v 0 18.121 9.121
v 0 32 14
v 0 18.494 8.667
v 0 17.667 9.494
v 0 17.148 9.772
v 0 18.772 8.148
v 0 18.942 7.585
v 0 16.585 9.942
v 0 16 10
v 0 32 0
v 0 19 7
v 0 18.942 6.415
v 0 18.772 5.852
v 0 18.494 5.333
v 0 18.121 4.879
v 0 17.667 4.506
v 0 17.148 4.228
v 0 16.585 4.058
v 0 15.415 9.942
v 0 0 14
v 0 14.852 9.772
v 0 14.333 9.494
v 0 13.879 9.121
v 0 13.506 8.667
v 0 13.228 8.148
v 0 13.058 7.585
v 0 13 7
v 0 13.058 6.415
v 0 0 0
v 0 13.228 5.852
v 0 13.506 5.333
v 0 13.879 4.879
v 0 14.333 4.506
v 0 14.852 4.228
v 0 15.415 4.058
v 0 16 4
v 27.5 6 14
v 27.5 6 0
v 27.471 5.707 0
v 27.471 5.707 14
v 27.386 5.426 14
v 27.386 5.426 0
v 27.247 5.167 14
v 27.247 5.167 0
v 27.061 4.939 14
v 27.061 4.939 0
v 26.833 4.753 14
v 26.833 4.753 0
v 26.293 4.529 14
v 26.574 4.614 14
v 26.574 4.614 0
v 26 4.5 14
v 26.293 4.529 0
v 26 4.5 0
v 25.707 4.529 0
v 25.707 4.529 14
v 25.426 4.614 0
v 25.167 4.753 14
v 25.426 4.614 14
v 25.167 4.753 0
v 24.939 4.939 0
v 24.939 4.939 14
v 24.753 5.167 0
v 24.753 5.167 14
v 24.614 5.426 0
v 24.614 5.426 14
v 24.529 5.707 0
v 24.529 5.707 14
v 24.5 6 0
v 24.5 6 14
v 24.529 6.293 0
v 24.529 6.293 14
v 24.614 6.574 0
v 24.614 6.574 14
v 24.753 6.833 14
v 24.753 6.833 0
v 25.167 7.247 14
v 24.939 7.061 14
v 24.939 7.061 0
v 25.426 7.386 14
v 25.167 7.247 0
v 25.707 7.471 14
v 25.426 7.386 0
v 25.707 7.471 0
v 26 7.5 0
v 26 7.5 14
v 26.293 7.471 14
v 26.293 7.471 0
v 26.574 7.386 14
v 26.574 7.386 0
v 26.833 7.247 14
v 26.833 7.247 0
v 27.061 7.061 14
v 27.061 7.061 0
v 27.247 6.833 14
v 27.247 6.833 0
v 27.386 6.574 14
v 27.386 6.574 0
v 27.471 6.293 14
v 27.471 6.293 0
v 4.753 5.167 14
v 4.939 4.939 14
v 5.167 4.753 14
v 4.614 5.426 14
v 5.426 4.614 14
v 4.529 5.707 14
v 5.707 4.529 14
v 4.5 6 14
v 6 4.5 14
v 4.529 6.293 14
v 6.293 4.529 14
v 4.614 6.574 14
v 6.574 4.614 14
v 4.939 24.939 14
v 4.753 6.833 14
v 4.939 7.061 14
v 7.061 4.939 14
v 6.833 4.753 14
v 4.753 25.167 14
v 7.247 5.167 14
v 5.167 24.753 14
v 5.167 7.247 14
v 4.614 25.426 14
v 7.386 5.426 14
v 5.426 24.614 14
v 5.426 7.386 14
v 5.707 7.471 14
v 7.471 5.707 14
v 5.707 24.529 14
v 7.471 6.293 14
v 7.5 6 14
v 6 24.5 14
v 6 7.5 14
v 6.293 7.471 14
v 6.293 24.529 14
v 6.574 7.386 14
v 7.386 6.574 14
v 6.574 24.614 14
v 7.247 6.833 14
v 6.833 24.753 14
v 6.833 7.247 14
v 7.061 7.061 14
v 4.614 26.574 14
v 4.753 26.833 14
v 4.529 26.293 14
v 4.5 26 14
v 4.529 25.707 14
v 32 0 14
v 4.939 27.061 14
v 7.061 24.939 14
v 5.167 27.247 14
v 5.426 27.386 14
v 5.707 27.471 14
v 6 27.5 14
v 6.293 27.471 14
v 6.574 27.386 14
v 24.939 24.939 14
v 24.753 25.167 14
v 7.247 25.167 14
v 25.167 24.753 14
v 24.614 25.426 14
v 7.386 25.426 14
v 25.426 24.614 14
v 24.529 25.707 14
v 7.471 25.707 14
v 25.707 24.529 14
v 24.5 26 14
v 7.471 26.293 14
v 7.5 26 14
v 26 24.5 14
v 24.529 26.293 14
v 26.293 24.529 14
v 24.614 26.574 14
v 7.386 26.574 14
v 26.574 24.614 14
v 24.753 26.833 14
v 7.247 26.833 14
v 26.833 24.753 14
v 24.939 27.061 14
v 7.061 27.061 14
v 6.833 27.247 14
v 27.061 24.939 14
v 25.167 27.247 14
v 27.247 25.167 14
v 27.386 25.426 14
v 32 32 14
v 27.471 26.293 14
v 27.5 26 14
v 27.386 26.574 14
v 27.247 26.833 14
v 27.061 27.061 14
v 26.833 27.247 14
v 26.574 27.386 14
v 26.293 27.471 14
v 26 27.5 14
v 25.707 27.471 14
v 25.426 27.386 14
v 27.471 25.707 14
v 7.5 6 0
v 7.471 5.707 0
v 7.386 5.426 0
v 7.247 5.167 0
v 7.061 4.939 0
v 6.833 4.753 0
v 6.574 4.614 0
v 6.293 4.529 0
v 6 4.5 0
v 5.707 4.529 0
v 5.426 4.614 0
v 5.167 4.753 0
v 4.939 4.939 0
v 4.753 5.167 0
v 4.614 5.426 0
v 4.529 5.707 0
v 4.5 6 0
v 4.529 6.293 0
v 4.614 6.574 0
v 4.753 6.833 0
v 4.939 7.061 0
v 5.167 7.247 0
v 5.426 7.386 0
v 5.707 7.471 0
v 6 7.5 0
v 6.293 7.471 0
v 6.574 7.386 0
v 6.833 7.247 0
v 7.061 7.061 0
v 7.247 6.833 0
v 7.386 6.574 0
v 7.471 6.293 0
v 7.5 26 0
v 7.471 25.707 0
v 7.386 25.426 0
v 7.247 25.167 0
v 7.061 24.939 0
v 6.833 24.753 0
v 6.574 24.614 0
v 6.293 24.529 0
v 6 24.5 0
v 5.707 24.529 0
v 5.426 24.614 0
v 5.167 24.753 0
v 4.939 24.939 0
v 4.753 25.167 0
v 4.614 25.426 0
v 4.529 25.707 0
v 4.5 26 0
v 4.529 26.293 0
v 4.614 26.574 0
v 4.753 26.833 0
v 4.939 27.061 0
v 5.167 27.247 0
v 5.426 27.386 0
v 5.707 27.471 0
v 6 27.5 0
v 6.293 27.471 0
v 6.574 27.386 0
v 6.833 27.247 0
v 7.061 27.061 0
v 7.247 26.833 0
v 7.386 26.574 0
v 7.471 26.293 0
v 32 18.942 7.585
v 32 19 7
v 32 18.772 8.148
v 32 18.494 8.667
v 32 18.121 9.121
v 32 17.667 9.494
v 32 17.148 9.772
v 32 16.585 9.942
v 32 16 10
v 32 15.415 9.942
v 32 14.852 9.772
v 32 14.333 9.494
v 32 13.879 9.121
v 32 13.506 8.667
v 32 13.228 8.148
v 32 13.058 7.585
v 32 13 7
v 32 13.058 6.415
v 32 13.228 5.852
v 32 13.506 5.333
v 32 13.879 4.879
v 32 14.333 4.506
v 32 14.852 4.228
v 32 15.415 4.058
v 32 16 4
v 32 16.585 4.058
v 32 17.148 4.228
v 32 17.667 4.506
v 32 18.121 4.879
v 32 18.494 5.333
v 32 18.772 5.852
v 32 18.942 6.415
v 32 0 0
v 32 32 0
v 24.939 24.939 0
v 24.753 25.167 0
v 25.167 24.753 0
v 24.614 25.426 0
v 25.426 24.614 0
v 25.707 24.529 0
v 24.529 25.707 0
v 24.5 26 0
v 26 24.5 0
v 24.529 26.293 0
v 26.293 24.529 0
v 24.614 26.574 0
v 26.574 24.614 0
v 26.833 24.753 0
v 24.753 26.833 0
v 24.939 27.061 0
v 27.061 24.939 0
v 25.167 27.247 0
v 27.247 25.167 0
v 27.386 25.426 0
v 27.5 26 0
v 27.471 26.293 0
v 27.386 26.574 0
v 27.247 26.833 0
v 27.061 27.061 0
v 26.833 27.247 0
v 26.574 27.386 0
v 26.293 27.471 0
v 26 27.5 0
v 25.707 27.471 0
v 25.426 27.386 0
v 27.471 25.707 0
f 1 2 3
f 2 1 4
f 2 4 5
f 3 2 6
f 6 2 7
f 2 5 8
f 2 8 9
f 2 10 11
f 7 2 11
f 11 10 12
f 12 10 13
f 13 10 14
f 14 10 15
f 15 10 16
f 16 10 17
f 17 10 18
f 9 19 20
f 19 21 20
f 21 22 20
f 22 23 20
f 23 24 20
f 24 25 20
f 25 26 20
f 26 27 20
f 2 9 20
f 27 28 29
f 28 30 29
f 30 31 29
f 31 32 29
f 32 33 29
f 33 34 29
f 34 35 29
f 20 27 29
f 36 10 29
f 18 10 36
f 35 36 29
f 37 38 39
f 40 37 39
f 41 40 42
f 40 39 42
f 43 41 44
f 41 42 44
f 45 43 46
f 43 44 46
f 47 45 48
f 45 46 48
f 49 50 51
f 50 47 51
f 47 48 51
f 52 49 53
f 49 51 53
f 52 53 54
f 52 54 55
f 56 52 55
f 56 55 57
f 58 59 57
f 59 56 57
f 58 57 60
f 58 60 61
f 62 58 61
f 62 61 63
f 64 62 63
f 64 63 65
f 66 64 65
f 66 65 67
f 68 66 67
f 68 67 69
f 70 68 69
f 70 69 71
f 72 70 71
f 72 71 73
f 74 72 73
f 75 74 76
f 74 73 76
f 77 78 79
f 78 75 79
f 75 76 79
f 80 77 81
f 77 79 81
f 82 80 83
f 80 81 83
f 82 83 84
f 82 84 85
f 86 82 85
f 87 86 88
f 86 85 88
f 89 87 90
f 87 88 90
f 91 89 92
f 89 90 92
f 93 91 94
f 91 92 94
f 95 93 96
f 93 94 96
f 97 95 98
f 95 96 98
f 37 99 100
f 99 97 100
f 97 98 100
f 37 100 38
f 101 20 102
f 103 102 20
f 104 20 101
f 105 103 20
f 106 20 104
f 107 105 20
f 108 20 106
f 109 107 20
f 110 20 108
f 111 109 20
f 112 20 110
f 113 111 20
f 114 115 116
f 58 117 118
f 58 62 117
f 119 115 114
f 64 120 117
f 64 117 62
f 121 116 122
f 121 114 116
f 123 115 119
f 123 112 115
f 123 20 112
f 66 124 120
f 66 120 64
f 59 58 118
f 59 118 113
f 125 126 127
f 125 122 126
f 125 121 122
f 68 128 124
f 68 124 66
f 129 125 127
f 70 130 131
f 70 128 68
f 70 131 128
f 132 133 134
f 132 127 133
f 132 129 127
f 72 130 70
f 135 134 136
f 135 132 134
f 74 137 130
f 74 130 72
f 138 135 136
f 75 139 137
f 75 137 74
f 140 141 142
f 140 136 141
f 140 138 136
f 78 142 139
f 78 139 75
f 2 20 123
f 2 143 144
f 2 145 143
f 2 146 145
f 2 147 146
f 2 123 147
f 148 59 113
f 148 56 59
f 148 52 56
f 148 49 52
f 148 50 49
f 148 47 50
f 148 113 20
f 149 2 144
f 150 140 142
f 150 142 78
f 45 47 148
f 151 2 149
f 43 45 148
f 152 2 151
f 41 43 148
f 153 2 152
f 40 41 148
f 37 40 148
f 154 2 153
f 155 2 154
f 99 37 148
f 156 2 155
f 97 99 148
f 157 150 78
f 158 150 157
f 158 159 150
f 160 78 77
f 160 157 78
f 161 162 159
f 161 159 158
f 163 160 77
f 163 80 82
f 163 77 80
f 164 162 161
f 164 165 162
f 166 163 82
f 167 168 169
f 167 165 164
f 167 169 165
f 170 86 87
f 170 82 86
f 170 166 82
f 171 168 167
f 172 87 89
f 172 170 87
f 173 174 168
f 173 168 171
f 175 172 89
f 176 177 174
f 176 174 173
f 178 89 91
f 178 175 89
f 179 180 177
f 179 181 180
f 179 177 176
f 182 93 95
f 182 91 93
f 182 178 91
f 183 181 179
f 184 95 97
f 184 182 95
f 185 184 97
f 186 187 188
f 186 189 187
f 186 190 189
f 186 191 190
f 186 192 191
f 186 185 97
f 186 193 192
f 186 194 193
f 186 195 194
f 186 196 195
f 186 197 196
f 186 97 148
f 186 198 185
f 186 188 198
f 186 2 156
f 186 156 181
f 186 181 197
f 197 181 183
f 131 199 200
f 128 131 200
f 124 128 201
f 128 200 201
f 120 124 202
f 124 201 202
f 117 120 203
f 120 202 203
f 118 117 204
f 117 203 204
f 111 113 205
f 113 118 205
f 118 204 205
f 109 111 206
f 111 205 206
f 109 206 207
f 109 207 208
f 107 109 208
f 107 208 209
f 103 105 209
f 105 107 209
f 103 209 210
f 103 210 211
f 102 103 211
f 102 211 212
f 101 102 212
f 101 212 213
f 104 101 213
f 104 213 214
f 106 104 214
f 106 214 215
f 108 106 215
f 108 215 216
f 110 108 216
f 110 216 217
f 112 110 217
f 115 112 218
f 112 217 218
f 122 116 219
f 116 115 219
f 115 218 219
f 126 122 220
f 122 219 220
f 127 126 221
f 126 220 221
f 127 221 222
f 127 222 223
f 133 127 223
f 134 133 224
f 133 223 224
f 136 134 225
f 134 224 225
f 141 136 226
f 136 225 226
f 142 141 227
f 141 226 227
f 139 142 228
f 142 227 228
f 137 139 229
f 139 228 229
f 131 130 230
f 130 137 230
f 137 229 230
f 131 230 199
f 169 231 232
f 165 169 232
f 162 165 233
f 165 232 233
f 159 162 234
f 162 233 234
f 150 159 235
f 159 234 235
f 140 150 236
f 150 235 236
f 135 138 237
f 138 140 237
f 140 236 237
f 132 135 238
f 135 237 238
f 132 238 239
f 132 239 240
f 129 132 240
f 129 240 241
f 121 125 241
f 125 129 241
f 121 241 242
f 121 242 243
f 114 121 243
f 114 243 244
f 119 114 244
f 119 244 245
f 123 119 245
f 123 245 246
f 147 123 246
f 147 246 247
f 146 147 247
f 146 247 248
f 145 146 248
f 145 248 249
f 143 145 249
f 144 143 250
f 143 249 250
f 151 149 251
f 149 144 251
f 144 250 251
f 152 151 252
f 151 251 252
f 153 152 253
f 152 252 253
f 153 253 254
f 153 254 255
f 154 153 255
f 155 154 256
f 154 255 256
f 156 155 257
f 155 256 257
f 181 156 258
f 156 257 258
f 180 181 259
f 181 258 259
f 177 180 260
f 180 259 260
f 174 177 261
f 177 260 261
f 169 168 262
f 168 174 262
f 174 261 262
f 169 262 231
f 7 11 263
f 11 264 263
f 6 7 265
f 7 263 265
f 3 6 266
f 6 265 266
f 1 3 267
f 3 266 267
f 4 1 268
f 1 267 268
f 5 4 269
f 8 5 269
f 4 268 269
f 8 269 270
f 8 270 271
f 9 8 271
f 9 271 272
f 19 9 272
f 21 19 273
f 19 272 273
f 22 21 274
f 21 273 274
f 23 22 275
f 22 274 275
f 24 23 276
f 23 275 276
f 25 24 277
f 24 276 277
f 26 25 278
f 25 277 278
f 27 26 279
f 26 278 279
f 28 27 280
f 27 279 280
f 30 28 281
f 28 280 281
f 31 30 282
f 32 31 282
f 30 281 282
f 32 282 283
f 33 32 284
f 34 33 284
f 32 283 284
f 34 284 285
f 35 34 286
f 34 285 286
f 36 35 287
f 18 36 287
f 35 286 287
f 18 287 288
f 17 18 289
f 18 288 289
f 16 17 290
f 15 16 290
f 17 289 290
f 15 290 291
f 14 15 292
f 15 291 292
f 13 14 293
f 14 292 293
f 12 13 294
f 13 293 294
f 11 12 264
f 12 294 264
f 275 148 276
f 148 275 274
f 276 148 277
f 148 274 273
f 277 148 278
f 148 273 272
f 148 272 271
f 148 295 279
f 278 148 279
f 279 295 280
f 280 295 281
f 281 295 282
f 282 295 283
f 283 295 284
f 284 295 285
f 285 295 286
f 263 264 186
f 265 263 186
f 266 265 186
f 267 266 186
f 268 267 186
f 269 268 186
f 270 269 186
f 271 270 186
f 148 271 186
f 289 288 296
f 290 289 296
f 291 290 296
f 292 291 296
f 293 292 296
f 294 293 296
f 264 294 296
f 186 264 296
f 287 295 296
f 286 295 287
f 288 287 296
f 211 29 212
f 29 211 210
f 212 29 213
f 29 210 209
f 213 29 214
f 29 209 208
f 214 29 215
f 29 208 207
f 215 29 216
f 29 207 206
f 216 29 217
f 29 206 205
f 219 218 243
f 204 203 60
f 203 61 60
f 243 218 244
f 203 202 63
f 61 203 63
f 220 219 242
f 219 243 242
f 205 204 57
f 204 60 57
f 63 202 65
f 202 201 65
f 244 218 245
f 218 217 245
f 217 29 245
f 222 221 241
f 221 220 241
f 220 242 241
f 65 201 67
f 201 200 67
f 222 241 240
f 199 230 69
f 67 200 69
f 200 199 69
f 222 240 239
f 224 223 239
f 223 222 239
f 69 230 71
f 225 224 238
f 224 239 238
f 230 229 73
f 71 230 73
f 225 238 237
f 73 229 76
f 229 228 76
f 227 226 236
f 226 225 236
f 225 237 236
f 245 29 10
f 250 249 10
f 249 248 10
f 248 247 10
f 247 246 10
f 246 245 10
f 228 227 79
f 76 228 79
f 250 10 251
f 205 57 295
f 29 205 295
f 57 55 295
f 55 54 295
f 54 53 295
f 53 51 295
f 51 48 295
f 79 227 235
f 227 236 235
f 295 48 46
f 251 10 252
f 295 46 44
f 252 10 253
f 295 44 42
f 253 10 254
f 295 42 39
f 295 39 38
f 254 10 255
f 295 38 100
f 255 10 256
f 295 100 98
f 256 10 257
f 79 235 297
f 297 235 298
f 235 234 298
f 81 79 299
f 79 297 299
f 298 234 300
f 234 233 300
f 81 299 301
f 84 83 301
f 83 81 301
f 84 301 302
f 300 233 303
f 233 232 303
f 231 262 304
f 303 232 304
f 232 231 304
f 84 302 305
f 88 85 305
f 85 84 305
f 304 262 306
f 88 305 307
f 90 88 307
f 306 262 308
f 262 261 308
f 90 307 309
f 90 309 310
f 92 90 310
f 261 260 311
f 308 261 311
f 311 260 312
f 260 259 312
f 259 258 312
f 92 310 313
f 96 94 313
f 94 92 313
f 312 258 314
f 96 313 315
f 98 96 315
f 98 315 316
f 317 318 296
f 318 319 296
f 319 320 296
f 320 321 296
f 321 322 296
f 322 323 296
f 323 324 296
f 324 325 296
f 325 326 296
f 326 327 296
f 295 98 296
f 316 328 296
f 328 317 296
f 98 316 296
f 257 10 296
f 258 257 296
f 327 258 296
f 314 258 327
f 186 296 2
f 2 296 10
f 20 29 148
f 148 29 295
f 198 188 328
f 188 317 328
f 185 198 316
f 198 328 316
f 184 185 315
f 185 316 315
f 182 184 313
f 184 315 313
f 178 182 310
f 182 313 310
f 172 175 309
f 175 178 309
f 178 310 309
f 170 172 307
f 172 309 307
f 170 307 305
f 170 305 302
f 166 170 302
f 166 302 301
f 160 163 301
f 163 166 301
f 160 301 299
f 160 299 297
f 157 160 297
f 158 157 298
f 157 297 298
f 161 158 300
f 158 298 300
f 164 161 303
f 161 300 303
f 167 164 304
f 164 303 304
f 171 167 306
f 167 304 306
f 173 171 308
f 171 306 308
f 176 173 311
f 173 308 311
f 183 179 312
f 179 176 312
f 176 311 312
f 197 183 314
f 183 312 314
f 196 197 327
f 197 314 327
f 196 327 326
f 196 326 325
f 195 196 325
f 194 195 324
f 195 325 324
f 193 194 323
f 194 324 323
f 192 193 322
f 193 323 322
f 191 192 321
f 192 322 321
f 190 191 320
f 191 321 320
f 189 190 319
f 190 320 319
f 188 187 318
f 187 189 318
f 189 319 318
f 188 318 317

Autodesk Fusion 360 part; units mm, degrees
sketch "Sketch1" plane through (0, 0, 0) normal (0, 0, 1) x (1, 0, 0)
  circle A0 centre (26, 26) radius 1.5
  circle A1 centre (6, 6) radius 1.5
  circle A2 centre (6, 26) radius 1.5
  line L0 (0, 0) -> (32, 0)
  circle A3 centre (26, 6) radius 1.5
  line L1 (32, 32) -> (0, 32)
  line L2 (0, 32) -> (0, 0)
  line L3 (32, 0) -> (32, 32)
  dimension "d5" = 20
  dimension "d6" = -20
  dimension "d7" = 32
  dimension "d8" = 32
  dimension "d9" = 3
  dimension "d10" = 6
  dimension "d11" = 6
extrude "Extrude1" add sketch "Sketch1" along normal blind 14
sketch "Sketch2" plane through (32, 0, 0) normal (1, 0, 0) x (0, 1, 0)
  line L0 (0, 0) -> (32, 0)
  line L1 (32, 0) -> (32, 14)
  line L2 (32, 14) -> (0, 14)
  line L3 (0, 14) -> (0, 0)
  line L4 (16, 14) -> (16, 0) construction
  line L5 (0, 7) -> (32, 7) construction
  circle A0 centre (16, 7) radius 3
  dimension "d14" = 6
extrude "Extrude2" cut sketch "Sketch2" against normal up to surface (32 mm away) contours A0
